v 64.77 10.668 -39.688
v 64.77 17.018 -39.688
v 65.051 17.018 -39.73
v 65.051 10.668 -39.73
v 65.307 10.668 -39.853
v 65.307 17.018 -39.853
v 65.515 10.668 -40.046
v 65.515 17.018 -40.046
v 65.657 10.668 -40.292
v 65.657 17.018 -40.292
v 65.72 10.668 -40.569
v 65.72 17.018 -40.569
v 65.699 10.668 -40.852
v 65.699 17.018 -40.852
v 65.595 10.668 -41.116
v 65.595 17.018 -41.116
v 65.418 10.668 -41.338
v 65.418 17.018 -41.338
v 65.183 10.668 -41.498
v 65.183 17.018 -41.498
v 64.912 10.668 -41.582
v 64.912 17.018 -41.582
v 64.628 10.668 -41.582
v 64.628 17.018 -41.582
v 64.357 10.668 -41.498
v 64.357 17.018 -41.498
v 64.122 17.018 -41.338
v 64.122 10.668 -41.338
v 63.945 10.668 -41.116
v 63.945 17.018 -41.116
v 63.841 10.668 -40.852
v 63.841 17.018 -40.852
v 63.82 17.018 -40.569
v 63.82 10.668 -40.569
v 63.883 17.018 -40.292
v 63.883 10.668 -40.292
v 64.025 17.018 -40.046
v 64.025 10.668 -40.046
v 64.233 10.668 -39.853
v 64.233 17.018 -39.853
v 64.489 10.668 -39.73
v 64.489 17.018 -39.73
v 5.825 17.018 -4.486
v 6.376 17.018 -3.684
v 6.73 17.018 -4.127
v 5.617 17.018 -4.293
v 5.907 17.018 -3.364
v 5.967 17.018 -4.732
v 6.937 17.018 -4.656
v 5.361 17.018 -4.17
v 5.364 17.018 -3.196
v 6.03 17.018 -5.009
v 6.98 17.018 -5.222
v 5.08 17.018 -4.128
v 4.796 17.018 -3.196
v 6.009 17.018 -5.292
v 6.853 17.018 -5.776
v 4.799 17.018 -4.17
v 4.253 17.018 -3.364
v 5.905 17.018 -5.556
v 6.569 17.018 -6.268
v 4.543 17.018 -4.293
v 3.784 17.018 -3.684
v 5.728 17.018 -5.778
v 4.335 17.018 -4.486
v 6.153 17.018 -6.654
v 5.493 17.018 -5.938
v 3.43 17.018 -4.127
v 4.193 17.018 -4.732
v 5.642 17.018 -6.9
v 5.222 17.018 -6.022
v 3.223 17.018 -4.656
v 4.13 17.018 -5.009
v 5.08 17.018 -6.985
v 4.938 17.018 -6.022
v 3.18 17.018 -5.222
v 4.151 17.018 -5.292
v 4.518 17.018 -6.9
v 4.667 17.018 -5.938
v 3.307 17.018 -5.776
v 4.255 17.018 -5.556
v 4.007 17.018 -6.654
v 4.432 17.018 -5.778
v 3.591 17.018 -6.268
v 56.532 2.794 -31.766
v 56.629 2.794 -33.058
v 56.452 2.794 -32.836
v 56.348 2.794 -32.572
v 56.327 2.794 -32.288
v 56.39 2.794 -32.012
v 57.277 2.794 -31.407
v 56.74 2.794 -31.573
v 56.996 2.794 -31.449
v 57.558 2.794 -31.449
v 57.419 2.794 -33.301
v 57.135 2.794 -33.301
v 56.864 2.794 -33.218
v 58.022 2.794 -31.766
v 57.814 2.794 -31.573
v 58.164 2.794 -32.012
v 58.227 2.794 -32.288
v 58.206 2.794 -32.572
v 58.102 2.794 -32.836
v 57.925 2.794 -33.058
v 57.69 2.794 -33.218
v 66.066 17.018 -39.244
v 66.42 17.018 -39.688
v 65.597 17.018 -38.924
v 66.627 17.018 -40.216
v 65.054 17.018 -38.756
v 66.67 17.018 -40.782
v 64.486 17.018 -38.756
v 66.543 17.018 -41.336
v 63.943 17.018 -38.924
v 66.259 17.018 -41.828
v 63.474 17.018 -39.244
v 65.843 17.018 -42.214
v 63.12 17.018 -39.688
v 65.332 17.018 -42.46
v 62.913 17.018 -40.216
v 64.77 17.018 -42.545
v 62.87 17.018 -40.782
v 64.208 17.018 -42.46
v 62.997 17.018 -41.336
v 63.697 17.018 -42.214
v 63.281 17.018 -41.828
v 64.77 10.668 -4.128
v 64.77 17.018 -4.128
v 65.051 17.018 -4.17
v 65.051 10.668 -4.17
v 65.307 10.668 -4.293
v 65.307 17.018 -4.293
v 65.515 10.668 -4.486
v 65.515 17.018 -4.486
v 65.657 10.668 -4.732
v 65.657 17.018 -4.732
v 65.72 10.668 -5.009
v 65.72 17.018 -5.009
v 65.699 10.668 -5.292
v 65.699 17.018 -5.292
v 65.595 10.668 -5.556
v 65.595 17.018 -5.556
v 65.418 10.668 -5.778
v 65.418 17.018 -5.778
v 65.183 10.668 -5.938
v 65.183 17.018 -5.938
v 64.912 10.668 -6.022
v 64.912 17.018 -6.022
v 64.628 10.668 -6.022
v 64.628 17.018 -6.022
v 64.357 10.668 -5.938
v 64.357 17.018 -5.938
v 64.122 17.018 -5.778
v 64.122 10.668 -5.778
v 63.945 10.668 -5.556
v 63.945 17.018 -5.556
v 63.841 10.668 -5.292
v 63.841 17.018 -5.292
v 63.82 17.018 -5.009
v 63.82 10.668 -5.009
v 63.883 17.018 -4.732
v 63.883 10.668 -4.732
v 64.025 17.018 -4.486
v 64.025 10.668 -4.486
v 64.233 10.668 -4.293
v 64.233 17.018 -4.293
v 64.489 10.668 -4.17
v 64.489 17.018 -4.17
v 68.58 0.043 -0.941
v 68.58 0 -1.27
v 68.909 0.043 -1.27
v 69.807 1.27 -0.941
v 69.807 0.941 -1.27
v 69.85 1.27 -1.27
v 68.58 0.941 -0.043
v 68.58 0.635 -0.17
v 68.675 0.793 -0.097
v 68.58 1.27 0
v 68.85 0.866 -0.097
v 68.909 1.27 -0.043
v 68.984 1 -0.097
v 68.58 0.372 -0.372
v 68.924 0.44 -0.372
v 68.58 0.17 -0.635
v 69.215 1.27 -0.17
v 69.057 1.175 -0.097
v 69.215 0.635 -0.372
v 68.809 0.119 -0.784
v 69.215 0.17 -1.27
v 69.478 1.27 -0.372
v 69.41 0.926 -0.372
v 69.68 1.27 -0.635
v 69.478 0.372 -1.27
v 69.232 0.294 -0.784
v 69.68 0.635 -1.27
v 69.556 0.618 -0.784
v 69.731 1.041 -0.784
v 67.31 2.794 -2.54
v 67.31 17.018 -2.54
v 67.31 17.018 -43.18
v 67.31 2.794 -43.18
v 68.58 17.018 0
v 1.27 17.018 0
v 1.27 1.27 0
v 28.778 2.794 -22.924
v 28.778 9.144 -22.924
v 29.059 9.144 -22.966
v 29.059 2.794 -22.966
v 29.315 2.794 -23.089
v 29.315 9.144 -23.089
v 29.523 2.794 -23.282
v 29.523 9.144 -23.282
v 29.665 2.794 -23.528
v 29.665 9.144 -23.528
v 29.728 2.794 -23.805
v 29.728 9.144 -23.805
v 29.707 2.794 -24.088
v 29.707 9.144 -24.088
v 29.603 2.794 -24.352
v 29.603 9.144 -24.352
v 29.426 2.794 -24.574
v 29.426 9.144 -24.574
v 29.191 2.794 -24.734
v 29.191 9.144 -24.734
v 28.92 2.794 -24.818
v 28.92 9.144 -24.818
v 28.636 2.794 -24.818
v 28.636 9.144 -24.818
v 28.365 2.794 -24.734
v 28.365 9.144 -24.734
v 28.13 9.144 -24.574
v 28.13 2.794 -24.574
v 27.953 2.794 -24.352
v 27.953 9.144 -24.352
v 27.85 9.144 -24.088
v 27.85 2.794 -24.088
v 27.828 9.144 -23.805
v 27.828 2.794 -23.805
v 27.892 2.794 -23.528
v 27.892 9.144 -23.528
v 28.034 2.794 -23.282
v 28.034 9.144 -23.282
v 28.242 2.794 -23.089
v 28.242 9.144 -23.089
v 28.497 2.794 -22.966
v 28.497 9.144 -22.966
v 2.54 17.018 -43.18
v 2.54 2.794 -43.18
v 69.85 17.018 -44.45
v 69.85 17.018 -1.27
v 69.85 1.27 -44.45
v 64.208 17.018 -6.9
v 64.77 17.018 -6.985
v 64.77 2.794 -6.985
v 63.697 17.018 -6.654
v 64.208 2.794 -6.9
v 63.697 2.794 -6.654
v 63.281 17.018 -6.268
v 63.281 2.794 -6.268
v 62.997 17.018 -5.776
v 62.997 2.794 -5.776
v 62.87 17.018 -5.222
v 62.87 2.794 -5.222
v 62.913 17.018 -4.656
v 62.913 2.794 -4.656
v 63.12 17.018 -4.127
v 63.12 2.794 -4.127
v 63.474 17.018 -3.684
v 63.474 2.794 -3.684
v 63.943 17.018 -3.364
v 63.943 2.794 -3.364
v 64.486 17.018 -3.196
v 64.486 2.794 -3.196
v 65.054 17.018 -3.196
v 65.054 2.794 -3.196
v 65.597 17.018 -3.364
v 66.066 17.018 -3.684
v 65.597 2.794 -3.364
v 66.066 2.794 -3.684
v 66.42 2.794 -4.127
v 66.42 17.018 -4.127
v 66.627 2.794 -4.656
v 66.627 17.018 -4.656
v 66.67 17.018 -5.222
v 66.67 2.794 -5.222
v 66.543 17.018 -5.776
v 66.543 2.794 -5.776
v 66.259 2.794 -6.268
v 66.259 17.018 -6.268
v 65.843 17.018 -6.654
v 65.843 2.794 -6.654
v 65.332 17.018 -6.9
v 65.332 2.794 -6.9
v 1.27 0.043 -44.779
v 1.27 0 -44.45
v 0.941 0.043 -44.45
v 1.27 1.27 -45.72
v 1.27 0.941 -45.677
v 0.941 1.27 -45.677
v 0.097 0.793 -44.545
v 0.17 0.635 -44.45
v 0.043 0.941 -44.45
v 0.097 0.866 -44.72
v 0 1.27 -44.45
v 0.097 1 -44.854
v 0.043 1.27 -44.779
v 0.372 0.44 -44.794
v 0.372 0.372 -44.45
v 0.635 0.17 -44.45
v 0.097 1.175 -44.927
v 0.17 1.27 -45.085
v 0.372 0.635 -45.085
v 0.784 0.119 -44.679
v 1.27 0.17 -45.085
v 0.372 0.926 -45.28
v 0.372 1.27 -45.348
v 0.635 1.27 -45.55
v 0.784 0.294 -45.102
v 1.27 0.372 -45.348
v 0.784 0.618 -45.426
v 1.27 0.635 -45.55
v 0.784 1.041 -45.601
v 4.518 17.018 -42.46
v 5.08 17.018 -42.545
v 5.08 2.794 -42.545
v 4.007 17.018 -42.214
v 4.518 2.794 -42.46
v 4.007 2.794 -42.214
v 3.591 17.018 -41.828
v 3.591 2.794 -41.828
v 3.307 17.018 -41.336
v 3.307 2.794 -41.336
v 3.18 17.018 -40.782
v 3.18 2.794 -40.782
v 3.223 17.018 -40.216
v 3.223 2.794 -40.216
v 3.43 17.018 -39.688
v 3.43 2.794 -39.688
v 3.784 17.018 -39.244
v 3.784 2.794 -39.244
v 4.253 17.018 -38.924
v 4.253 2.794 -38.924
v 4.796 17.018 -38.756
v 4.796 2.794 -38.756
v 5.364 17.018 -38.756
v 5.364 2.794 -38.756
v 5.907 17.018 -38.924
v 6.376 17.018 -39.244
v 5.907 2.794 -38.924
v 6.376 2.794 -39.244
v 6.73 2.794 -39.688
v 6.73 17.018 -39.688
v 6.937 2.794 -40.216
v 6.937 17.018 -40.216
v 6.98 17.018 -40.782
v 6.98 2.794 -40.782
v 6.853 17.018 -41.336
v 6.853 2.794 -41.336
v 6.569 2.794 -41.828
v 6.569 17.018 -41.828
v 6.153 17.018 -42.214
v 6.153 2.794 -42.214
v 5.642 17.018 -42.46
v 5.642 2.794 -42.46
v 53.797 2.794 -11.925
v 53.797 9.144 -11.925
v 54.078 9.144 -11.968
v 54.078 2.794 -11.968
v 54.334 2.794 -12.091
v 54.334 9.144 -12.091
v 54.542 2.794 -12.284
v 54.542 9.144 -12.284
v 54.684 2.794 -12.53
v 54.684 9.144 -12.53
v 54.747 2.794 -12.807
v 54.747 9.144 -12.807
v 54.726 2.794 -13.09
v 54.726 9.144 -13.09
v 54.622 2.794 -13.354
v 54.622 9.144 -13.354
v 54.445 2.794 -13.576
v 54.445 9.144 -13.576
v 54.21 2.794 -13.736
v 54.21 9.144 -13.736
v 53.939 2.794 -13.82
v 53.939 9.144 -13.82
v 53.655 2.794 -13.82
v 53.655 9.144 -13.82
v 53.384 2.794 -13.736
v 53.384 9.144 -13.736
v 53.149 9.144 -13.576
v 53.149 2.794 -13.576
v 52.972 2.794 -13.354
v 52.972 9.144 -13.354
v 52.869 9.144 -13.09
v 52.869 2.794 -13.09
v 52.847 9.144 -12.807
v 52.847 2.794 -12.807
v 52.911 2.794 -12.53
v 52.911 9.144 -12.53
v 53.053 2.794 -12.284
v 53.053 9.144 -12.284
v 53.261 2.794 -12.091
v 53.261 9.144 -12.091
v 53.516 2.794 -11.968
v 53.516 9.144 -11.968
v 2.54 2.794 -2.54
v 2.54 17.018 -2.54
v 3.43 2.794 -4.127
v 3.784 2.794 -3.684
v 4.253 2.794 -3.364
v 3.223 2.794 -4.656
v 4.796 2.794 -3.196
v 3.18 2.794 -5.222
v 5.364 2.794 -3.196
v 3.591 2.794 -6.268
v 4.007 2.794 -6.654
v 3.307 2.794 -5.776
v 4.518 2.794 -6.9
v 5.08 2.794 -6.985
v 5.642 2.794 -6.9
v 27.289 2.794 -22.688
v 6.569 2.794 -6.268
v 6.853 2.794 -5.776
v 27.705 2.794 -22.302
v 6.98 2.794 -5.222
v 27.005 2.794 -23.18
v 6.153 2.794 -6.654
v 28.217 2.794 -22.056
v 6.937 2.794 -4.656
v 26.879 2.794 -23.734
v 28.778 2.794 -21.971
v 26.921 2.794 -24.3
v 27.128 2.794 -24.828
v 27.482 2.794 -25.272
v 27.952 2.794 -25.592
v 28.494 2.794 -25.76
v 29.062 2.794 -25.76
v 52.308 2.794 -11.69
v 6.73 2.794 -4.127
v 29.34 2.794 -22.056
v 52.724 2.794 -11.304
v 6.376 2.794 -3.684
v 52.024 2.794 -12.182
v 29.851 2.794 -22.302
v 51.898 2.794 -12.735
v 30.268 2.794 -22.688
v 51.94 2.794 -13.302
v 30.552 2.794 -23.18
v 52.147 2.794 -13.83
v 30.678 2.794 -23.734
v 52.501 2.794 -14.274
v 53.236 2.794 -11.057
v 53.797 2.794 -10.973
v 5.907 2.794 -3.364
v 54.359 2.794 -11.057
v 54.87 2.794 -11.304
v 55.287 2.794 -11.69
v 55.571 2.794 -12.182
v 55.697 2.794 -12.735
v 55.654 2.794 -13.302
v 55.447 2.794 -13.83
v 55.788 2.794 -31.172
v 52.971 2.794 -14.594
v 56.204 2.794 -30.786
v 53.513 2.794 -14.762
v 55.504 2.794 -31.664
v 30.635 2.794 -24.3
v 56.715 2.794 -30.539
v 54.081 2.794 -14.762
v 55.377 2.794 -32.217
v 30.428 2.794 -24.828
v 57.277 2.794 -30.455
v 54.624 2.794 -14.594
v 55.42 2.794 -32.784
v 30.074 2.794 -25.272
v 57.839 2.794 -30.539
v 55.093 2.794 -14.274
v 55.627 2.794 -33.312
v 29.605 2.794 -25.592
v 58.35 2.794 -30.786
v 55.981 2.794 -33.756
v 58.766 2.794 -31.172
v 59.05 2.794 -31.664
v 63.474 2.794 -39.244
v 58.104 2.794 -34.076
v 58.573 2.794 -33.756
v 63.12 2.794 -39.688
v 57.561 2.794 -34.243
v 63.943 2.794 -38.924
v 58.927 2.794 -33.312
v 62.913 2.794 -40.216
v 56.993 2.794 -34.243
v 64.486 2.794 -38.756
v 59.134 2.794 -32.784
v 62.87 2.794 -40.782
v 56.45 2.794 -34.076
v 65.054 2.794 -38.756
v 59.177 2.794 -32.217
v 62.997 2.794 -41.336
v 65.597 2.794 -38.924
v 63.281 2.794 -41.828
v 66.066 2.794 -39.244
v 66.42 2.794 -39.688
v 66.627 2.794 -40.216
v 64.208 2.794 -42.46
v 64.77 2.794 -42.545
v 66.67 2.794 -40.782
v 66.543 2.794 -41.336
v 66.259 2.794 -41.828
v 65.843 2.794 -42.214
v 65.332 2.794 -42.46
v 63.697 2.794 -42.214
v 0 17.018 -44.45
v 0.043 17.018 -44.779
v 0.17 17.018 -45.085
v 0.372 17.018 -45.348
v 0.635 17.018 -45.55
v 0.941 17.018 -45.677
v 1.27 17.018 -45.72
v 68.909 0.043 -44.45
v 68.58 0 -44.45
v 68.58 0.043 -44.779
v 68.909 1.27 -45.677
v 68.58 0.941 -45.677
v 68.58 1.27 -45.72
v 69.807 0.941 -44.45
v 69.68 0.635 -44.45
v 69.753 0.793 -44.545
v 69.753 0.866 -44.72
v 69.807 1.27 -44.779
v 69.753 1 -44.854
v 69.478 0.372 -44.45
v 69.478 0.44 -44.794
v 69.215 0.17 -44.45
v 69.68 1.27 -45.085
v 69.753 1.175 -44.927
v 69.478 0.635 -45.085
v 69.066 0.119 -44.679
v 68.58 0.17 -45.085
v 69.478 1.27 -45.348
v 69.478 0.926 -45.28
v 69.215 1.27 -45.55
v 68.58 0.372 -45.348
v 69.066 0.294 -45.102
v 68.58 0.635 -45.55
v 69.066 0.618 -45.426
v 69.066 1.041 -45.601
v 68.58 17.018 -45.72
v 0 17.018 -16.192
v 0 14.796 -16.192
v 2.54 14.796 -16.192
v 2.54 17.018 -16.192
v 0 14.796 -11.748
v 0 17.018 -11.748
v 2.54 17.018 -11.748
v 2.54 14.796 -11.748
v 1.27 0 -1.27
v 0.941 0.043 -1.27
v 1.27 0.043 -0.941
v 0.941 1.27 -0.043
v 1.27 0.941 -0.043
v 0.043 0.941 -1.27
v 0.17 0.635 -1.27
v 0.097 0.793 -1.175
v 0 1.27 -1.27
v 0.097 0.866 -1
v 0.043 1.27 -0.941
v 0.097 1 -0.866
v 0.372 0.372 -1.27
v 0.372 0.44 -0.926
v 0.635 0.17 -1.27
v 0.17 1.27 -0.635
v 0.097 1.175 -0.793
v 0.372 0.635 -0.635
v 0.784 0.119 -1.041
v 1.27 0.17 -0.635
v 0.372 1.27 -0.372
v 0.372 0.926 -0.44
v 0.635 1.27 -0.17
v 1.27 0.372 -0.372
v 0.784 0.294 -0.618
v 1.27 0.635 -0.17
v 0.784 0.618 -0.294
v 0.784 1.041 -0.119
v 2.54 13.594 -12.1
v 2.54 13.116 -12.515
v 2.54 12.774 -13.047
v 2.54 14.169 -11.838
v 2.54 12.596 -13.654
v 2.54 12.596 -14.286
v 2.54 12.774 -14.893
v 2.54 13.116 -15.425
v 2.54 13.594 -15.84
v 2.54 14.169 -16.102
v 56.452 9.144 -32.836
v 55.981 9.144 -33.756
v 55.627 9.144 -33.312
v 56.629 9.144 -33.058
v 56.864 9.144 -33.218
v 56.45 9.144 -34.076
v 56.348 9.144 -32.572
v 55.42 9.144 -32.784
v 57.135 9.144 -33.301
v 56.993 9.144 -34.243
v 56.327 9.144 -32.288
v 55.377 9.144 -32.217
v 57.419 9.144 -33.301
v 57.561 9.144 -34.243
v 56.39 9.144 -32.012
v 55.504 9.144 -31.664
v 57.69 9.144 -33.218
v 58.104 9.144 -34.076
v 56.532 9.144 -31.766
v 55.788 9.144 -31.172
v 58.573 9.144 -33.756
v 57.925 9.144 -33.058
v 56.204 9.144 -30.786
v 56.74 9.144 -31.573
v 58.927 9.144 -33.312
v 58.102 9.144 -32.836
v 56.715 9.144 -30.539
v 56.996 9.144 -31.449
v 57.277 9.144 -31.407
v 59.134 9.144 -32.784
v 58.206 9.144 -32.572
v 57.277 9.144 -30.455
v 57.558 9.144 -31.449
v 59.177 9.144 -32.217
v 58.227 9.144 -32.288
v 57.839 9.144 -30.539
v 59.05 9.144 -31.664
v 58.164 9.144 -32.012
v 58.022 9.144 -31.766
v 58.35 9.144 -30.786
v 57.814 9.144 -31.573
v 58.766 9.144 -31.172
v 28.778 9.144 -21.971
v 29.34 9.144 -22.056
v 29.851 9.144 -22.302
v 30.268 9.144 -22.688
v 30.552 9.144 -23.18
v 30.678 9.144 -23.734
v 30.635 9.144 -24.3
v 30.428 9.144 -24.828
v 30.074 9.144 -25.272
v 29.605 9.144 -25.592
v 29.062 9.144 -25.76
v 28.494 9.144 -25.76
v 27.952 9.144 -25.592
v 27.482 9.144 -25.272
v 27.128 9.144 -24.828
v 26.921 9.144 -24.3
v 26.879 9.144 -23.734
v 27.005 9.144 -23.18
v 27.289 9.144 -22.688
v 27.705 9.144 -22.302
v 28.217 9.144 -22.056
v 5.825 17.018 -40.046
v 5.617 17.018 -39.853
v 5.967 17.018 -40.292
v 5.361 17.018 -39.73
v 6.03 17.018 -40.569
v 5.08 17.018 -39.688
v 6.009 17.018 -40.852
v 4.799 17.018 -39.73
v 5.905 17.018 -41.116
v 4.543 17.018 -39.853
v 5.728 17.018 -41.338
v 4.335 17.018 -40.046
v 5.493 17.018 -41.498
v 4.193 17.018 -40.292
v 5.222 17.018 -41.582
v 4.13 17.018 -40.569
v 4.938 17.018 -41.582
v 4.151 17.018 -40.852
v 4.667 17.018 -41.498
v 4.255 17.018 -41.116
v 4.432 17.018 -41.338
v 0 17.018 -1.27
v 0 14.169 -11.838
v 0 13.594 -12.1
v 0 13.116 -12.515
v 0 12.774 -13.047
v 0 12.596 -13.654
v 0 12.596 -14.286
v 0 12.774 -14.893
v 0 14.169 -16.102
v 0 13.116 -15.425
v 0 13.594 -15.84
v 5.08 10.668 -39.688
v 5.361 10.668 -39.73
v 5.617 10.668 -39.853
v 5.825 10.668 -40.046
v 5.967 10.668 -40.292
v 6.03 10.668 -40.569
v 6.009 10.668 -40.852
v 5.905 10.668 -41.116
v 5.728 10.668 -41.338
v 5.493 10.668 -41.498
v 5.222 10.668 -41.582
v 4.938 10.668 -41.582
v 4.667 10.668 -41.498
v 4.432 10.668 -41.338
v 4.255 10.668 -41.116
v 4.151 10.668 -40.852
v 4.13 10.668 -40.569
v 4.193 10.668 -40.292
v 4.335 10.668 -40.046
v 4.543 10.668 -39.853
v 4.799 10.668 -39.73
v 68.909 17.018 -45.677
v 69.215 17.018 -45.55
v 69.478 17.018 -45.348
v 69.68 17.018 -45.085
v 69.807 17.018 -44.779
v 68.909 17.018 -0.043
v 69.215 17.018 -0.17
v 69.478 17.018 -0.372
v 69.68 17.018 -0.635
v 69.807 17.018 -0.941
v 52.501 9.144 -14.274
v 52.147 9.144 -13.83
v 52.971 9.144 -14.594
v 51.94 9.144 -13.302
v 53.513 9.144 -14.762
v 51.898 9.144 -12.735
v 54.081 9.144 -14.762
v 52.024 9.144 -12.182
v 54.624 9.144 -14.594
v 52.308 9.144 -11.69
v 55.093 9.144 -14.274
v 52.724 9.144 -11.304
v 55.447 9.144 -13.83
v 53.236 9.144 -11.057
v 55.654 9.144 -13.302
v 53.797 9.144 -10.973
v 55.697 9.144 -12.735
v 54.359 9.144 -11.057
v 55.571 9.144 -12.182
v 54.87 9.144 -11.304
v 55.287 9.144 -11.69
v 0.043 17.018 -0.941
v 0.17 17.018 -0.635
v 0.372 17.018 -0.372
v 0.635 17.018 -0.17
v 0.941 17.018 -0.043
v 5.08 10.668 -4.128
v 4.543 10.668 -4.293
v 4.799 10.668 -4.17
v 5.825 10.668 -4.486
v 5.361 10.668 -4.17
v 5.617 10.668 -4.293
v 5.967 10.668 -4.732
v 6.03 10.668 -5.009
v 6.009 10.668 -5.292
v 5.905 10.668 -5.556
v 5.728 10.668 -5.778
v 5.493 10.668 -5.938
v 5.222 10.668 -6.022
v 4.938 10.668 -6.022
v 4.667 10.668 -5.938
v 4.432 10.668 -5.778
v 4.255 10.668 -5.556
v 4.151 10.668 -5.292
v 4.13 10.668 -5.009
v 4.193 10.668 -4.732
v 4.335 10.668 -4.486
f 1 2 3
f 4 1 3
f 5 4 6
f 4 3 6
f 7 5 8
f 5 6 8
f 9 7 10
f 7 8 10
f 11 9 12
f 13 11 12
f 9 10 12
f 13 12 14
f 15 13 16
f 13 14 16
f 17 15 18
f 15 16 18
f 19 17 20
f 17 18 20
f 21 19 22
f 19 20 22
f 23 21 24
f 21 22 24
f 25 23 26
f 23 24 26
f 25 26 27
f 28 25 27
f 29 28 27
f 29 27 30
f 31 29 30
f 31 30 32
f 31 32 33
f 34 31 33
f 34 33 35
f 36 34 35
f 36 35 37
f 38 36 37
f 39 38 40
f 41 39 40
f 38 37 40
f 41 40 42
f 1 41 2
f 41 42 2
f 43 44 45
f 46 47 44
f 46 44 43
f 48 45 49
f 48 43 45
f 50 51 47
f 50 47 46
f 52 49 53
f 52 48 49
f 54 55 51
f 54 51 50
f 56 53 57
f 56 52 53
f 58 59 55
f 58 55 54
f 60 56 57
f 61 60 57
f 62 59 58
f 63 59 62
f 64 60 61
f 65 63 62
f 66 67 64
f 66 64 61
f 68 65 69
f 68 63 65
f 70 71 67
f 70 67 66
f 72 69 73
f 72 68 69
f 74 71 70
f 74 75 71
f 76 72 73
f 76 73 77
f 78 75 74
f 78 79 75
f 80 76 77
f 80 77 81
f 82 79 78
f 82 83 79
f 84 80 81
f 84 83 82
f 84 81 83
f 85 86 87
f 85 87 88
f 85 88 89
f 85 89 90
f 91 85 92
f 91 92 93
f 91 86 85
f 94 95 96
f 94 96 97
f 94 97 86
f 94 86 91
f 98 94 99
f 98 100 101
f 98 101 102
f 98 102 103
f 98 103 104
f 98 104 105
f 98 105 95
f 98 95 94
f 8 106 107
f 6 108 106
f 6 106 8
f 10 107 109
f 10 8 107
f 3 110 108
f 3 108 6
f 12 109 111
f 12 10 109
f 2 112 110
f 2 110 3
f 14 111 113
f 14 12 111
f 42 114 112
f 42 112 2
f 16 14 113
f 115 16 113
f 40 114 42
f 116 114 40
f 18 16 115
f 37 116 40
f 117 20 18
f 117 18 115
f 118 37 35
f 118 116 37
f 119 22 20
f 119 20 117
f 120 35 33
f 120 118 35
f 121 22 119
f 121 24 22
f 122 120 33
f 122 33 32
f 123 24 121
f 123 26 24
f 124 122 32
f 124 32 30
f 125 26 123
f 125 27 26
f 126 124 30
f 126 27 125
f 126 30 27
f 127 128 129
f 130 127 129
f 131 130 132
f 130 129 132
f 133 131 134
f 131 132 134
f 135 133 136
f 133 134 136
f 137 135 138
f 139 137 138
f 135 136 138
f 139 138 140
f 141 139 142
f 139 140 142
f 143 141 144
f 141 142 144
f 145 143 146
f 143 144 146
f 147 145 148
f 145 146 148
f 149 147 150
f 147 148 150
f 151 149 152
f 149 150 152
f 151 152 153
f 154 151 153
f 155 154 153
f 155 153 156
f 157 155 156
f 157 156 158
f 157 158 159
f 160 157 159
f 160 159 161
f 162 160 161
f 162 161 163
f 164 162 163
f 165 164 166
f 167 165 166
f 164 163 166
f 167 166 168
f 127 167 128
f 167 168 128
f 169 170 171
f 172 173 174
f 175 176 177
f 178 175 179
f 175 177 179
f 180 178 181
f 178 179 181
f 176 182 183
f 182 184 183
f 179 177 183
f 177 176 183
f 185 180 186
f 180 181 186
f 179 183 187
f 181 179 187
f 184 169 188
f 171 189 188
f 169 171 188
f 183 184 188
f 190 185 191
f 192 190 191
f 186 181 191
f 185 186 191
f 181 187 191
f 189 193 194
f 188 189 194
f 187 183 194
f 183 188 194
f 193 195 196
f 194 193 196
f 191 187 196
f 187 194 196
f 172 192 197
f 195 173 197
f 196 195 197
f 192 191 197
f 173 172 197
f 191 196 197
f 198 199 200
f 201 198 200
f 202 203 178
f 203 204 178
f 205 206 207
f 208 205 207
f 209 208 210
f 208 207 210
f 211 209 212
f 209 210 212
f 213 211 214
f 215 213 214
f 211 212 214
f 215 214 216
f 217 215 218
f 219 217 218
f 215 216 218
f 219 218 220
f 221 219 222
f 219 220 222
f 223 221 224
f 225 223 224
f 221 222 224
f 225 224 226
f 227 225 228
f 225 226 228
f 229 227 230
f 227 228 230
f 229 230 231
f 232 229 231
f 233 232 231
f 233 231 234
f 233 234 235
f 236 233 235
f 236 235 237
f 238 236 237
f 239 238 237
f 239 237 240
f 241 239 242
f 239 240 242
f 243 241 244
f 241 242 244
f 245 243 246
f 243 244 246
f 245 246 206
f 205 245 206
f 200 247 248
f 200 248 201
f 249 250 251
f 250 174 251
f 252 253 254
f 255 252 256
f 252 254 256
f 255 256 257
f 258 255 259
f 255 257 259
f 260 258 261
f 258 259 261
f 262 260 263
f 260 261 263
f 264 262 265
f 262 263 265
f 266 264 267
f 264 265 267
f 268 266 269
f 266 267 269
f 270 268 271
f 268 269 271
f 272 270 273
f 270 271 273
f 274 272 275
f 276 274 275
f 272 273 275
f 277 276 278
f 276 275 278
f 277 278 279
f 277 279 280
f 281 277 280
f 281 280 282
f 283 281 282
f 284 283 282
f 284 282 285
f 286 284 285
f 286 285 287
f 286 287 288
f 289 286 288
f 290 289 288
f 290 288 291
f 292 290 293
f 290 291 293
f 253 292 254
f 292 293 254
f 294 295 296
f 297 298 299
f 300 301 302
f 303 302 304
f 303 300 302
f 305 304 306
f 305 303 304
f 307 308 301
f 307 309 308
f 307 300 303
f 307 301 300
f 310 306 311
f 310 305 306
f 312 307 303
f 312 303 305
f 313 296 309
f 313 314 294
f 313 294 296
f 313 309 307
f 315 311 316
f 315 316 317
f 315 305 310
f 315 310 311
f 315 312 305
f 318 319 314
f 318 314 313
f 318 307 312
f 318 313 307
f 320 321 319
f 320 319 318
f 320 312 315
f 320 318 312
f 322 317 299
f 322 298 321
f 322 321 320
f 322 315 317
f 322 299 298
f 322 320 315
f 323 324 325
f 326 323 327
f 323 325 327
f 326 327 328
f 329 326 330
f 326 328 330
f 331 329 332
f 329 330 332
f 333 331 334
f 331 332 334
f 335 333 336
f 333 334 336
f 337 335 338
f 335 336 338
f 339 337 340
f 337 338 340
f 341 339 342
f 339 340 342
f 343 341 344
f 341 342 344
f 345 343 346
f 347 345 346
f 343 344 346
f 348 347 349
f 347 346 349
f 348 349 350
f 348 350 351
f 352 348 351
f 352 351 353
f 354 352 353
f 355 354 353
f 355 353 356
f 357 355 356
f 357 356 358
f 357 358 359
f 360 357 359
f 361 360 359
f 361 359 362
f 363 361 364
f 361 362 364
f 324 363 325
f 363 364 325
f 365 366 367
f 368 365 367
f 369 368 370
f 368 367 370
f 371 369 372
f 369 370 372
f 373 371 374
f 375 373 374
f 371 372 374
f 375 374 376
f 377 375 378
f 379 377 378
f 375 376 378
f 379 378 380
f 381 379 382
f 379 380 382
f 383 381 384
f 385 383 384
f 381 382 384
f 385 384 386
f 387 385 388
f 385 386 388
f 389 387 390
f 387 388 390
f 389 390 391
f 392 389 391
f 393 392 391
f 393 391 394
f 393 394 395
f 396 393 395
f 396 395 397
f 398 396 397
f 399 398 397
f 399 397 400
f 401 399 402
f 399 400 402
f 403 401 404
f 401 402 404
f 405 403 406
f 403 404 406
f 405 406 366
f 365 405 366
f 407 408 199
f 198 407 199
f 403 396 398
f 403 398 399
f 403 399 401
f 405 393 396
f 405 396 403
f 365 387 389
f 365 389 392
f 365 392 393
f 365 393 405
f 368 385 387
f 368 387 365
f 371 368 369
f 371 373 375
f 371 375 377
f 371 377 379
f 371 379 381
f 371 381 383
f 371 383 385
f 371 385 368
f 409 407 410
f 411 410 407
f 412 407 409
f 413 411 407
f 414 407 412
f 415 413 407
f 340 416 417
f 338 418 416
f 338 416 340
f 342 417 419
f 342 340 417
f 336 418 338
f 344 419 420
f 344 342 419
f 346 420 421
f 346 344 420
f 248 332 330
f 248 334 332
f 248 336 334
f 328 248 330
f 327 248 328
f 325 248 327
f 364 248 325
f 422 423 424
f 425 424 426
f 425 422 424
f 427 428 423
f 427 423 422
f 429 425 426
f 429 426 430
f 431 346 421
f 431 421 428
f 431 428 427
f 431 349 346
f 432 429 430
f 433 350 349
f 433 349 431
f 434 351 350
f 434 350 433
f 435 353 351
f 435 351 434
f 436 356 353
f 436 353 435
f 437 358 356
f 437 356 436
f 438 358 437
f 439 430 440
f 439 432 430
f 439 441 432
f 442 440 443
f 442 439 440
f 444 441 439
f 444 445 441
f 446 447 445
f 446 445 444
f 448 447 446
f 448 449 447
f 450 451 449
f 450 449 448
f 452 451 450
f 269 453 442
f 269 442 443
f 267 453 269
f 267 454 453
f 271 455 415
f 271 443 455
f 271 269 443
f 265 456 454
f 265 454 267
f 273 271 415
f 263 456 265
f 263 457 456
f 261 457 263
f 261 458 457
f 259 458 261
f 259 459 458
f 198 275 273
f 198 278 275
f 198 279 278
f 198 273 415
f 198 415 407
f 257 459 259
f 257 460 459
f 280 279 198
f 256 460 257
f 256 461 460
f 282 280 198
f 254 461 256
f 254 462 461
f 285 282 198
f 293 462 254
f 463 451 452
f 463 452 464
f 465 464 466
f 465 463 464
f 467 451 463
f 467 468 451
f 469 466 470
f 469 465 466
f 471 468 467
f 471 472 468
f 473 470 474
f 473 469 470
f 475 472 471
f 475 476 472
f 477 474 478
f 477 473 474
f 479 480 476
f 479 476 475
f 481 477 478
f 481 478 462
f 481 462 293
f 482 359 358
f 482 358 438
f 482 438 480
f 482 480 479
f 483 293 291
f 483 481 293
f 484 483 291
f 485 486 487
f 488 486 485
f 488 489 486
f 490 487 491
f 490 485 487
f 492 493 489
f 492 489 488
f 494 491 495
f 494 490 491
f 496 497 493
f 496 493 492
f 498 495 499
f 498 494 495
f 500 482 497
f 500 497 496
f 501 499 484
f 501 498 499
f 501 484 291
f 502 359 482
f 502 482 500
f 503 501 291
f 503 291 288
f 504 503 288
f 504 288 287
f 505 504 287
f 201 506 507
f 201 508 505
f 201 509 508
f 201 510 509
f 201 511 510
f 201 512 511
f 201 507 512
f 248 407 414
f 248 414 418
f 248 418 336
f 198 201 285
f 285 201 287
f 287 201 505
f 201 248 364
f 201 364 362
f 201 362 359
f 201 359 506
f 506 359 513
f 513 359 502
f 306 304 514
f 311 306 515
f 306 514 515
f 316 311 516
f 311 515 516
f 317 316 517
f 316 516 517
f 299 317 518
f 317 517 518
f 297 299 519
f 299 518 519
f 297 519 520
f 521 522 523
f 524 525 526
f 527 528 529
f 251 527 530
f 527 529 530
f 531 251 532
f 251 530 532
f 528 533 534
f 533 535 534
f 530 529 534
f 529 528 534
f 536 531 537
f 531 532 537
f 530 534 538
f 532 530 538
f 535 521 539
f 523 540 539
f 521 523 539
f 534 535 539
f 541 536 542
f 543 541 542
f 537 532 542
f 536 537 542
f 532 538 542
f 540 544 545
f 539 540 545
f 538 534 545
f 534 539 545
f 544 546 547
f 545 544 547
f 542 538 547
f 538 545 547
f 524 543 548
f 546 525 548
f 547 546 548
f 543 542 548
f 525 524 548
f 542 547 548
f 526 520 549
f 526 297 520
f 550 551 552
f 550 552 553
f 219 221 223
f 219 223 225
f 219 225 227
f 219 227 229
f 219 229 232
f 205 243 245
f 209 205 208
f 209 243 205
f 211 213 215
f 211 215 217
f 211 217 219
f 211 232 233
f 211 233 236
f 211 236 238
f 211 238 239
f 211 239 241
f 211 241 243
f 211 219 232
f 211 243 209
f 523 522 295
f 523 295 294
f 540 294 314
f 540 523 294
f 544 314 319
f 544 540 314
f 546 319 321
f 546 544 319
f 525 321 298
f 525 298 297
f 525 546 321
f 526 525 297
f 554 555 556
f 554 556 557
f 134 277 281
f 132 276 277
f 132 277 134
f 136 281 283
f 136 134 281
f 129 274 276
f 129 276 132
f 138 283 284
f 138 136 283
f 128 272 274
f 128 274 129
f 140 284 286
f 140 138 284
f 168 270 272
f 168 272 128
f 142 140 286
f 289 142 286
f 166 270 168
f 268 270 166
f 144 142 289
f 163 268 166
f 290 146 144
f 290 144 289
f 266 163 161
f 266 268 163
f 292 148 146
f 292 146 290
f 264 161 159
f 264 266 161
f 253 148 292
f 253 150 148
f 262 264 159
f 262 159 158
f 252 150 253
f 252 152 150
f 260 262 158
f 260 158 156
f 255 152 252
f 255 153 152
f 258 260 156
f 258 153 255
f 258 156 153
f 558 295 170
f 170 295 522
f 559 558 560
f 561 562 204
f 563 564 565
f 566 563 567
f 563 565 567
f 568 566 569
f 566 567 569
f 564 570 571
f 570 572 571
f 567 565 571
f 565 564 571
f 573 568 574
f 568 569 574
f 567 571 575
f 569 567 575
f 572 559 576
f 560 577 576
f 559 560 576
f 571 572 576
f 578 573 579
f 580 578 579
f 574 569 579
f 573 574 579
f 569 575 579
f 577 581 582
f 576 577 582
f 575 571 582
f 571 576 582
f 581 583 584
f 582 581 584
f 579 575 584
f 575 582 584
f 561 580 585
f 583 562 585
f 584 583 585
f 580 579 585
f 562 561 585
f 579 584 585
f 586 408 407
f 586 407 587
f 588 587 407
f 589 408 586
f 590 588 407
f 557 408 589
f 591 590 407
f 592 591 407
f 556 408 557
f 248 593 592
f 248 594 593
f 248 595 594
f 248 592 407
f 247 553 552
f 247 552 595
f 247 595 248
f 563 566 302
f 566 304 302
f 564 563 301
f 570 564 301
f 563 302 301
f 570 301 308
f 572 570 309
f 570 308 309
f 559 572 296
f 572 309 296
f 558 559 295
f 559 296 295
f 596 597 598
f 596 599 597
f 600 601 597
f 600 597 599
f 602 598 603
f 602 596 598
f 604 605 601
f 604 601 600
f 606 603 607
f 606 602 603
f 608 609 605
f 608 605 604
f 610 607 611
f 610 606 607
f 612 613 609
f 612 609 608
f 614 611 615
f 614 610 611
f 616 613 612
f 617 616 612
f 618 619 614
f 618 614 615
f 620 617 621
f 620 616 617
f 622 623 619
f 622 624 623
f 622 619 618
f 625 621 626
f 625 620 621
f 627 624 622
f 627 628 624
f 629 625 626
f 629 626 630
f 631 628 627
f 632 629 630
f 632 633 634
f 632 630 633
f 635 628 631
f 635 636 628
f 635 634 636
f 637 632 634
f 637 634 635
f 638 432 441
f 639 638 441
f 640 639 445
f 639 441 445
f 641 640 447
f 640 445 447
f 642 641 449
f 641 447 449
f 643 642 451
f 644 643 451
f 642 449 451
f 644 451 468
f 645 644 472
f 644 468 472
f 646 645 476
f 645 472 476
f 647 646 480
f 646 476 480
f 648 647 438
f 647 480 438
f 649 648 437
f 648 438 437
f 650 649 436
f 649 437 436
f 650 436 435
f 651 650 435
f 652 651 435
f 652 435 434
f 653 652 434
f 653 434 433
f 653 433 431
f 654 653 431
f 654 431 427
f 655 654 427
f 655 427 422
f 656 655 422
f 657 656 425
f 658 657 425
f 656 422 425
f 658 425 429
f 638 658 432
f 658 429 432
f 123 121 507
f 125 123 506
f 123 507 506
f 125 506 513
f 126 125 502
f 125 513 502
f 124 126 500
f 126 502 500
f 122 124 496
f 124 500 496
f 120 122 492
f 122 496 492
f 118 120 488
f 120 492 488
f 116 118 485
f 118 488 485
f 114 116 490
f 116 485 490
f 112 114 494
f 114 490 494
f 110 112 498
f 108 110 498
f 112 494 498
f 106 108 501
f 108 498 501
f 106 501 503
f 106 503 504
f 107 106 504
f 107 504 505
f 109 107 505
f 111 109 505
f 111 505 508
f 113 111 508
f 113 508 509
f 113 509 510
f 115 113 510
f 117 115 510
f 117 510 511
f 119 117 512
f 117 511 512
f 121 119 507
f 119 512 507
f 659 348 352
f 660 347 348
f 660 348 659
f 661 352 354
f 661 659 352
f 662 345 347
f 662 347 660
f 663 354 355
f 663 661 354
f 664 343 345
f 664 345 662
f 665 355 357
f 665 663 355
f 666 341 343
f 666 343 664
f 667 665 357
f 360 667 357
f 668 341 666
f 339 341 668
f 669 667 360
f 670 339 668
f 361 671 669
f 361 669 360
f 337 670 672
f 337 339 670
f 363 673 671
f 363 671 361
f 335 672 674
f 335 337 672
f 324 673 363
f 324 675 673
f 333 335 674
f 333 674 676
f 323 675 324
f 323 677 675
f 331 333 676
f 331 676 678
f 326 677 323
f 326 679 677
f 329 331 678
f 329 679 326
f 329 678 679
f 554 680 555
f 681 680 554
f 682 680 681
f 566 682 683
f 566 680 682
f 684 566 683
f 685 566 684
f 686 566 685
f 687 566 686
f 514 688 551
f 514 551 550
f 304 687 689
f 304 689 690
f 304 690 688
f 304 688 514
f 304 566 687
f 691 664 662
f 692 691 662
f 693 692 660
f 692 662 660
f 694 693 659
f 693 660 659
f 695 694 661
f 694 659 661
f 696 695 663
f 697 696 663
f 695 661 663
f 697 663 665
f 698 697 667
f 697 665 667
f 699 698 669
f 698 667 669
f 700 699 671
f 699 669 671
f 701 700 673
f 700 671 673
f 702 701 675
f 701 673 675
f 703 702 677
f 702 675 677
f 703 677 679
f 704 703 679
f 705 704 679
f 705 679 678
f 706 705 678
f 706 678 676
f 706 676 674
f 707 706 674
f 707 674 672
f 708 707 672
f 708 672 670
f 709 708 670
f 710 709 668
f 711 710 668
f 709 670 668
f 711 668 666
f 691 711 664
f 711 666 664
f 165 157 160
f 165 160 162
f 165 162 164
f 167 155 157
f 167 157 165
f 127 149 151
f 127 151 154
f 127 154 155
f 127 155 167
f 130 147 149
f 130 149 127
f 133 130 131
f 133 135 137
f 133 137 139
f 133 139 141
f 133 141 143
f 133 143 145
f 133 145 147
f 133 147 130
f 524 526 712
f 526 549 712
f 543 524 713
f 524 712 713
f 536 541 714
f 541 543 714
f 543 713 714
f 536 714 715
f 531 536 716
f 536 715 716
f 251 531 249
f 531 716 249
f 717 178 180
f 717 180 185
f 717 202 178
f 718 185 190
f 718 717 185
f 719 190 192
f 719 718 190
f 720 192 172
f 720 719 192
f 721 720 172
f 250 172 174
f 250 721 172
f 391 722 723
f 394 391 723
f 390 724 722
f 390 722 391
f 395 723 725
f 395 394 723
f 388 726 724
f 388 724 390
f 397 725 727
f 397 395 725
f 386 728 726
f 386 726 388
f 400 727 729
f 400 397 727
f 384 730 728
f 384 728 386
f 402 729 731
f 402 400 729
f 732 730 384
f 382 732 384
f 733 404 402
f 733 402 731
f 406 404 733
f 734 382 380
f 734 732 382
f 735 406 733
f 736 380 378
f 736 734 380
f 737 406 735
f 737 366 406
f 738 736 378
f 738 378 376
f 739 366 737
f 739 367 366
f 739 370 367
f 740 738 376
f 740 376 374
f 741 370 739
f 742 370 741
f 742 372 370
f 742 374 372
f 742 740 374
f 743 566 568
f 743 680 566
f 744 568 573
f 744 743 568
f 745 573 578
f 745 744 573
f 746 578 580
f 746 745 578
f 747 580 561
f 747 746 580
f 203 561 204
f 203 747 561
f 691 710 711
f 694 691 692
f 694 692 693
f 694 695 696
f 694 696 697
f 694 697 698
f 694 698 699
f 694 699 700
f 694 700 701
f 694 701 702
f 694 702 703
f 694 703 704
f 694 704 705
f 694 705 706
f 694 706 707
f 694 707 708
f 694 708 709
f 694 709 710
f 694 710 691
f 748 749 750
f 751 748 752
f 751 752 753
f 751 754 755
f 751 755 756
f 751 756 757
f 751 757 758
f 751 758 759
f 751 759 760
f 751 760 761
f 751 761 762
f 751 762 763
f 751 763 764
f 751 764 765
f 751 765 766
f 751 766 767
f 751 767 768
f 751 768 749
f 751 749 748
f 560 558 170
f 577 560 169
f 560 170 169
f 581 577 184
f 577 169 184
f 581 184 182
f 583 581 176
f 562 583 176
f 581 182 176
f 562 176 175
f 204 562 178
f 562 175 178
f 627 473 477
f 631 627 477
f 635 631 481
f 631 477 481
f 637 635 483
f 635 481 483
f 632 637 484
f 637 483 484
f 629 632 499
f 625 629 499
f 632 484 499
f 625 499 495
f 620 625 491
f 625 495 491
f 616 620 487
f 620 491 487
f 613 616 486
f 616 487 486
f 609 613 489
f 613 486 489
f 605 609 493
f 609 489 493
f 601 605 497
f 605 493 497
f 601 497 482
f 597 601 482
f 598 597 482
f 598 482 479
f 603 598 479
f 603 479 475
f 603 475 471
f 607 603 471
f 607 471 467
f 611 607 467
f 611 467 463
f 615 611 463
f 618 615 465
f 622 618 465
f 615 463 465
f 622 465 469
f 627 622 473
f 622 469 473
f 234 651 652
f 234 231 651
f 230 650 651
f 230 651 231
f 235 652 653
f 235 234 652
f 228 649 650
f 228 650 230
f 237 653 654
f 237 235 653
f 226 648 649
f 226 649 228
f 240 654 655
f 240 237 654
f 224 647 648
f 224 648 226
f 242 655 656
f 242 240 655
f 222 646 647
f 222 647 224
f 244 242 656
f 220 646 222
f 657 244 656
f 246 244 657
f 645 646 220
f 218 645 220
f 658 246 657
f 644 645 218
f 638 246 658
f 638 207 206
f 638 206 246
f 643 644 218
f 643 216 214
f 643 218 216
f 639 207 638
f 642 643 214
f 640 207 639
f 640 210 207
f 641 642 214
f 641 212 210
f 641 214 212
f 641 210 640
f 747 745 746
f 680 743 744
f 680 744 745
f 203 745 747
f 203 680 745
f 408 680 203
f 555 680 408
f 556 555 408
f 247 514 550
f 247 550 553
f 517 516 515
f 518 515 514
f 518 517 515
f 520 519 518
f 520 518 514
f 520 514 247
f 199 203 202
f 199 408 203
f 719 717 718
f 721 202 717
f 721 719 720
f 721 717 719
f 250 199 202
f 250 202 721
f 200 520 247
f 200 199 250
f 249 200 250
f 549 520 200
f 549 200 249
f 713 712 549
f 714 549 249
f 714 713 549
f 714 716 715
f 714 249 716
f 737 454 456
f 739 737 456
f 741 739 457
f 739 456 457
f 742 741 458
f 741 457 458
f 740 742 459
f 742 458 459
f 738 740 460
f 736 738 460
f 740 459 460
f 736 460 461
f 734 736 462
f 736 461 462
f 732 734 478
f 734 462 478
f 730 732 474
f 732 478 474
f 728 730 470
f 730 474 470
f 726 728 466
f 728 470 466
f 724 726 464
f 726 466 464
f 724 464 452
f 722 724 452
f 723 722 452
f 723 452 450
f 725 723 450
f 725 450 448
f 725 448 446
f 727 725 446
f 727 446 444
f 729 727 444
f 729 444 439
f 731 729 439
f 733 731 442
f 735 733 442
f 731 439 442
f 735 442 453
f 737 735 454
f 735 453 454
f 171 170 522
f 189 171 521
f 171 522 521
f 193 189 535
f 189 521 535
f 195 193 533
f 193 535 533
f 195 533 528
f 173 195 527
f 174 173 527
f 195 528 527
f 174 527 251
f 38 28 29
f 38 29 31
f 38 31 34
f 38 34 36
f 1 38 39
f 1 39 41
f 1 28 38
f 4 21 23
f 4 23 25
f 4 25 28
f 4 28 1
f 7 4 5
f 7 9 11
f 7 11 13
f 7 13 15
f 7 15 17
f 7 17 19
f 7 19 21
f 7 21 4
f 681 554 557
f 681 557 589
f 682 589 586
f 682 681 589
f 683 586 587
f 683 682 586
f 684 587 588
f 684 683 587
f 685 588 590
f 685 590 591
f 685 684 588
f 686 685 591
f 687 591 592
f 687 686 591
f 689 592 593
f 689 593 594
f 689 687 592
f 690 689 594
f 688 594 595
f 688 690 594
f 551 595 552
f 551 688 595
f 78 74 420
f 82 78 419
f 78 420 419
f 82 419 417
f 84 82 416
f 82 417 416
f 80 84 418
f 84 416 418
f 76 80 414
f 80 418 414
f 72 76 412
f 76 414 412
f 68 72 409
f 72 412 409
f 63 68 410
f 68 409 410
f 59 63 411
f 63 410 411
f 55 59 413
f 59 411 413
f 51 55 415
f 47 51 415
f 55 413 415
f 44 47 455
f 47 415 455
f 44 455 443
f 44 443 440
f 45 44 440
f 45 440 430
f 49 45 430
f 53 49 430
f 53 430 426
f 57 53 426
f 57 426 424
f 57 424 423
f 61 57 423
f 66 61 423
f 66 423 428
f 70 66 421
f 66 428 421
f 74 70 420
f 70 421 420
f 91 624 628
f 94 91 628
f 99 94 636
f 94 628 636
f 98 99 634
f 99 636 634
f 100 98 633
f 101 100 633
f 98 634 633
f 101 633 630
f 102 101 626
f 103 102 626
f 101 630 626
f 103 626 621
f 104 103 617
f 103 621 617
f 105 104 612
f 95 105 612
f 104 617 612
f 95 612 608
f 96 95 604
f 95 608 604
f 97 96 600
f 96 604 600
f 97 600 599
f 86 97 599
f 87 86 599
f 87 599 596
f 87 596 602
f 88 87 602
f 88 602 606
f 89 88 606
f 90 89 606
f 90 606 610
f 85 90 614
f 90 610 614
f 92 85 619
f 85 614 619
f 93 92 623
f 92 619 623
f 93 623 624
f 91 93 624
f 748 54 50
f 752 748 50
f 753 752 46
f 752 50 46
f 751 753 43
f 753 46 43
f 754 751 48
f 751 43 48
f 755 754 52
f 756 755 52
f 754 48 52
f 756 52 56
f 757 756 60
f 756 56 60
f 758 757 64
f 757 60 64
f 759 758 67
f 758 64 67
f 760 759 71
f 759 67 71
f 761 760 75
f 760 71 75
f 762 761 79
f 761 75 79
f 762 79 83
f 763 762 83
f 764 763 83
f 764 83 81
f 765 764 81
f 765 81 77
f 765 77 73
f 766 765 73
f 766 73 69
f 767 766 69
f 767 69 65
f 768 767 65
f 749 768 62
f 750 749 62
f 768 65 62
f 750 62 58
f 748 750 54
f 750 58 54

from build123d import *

# Parameters (mm, degrees)
SKETCH2_W            = 69.85
SKETCH2_H            = 45.72
BOSS_EXTRUDE1_DEPTH  = 17.018
SKETCH3_W            = 64.77
SKETCH3_H            = 40.64
CUT_EXTRUDE1_DEPTH   = 14.224
SKETCH13_R           = 1.905
BOSS_EXTRUDE5_DEPTH  = 6.35
SKETCH14_R           = 0.9525
CUT_EXTRUDE4_DEPTH   = 6.35
CUT_EXTRUDE5_DEPTH   = 2.54
FILLET1_R            = 1.27
SKETCH18_R           = 1.905
BOSS_EXTRUDE11_DEPTH = 14.224
SKETCH19_R           = 0.9525
CUT_EXTRUDE6_DEPTH   = 6.35


with BuildPart() as part:
    # Sketch2 → Boss-Extrude1 (new body)
    with BuildSketch(Plane(origin=(0, 0, 0), x_dir=(1, 0, 0), z_dir=(0, 1, 0))):
        with Locations((34.925, 22.86)):
            Rectangle(SKETCH2_W, SKETCH2_H)
    extrude(amount=BOSS_EXTRUDE1_DEPTH)

    # Sketch3 → Cut-Extrude1 (cut)
    with BuildSketch(Plane(origin=(0, 17.018, 0), x_dir=(1, 0, 0), z_dir=(0, 1, 0))):
        with Locations((34.925, 22.86)):
            Rectangle(SKETCH3_W, SKETCH3_H)
    extrude(amount=-CUT_EXTRUDE1_DEPTH, mode=Mode.SUBTRACT)

    # Sketch13 → Boss-Extrude5 (add)
    with BuildSketch(Plane(origin=(0, 2.794, 0), x_dir=(1, 0, 0), z_dir=(0, 1, 0))):
        with Locations(Location((57.277, 32.3596, 0), (0, 0, 270))):
            Circle(SKETCH13_R)
        with Locations(Location((53.7972, 12.8778, 0), (0, 0, 270))):
            Circle(SKETCH13_R)
        with Locations(Location((28.7782, 23.876, 0), (0, 0, 270))):
            Circle(SKETCH13_R)
    extrude(amount=BOSS_EXTRUDE5_DEPTH)

    # Sketch14 → Cut-Extrude4 (cut)
    with BuildSketch(Plane(origin=(0, 9.144, 0), x_dir=(1, 0, 0), z_dir=(0, 1, 0))):
        with Locations(Location((57.277, 32.3596, 0), (0, 0, 270))):
            Circle(SKETCH14_R)
        with Locations(Location((53.7972, 12.8778, 0), (0, 0, 270))):
            Circle(SKETCH14_R)
        with Locations(Location((28.7782, 23.876, 0), (0, 0, 270))):
            Circle(SKETCH14_R)
    extrude(amount=-CUT_EXTRUDE4_DEPTH, mode=Mode.SUBTRACT)

    # Sketch17 → Cut-Extrude5 (cut)
    with BuildSketch(Plane.ZY):
        with BuildLine():
            Line((-16.1925, 14.7955), (-16.1925, 17.018))
            Line((-16.1925, 17.018), (-11.7475, 17.018))
            Line((-11.7475, 17.018), (-11.7475, 14.7955))
            ThreePointArc((-11.7475, 14.7955), (-13.97, 12.573), (-16.1925, 14.7955))
        make_face()
    extrude(amount=-CUT_EXTRUDE5_DEPTH, mode=Mode.SUBTRACT)

    # Fillet1
    fillet1_edges = [part.edges().sort_by_distance(p)[0] for p in [
        (34.925, 0, -45.72),
        (69.85, 0, -22.86),
        (34.925, 0, 0),
        (0, 0, -22.86),
        (0, 8.509, -45.72),
        (69.85, 8.509, -45.72),
        (69.85, 8.509, 0),
        (0, 8.509, 0),
    ]]
    fillet(fillet1_edges, radius=FILLET1_R)

    # Sketch18 → Boss-Extrude11 (add)
    with BuildSketch(Plane(origin=(0, 2.794, 0), x_dir=(1, 0, 0), z_dir=(0, 1, 0))):
        with Locations(Location((5.08, 40.64, 0), (0, 0, 90))):
            Circle(SKETCH18_R)
        with Locations(Location((64.77, 40.64, 0), (0, 0, 90))):
            Circle(SKETCH18_R)
        with Locations(Location((5.08, 5.08, 0), (0, 0, 90))):
            Circle(SKETCH18_R)
        with Locations(Location((64.77, 5.08, 0), (0, 0, 90))):
            Circle(SKETCH18_R)
    extrude(amount=BOSS_EXTRUDE11_DEPTH)

    # Sketch19 → Cut-Extrude6 (cut)
    with BuildSketch(Plane(origin=(0, 17.018, 0), x_dir=(1, 0, 0), z_dir=(0, 1, 0))):
        with Locations(Location((5.08, 40.64, 0), (0, 0, 270))):
            Circle(SKETCH19_R)
        with Locations(Location((64.77, 40.64, 0), (0, 0, 270))):
            Circle(SKETCH19_R)
        with Locations(Location((64.77, 5.08, 0), (0, 0, 270))):
            Circle(SKETCH19_R)
        with Locations(Location((5.08, 5.08, 0), (0, 0, 270))):
            Circle(SKETCH19_R)
    extrude(amount=-CUT_EXTRUDE6_DEPTH, mode=Mode.SUBTRACT)


solid = part.part
